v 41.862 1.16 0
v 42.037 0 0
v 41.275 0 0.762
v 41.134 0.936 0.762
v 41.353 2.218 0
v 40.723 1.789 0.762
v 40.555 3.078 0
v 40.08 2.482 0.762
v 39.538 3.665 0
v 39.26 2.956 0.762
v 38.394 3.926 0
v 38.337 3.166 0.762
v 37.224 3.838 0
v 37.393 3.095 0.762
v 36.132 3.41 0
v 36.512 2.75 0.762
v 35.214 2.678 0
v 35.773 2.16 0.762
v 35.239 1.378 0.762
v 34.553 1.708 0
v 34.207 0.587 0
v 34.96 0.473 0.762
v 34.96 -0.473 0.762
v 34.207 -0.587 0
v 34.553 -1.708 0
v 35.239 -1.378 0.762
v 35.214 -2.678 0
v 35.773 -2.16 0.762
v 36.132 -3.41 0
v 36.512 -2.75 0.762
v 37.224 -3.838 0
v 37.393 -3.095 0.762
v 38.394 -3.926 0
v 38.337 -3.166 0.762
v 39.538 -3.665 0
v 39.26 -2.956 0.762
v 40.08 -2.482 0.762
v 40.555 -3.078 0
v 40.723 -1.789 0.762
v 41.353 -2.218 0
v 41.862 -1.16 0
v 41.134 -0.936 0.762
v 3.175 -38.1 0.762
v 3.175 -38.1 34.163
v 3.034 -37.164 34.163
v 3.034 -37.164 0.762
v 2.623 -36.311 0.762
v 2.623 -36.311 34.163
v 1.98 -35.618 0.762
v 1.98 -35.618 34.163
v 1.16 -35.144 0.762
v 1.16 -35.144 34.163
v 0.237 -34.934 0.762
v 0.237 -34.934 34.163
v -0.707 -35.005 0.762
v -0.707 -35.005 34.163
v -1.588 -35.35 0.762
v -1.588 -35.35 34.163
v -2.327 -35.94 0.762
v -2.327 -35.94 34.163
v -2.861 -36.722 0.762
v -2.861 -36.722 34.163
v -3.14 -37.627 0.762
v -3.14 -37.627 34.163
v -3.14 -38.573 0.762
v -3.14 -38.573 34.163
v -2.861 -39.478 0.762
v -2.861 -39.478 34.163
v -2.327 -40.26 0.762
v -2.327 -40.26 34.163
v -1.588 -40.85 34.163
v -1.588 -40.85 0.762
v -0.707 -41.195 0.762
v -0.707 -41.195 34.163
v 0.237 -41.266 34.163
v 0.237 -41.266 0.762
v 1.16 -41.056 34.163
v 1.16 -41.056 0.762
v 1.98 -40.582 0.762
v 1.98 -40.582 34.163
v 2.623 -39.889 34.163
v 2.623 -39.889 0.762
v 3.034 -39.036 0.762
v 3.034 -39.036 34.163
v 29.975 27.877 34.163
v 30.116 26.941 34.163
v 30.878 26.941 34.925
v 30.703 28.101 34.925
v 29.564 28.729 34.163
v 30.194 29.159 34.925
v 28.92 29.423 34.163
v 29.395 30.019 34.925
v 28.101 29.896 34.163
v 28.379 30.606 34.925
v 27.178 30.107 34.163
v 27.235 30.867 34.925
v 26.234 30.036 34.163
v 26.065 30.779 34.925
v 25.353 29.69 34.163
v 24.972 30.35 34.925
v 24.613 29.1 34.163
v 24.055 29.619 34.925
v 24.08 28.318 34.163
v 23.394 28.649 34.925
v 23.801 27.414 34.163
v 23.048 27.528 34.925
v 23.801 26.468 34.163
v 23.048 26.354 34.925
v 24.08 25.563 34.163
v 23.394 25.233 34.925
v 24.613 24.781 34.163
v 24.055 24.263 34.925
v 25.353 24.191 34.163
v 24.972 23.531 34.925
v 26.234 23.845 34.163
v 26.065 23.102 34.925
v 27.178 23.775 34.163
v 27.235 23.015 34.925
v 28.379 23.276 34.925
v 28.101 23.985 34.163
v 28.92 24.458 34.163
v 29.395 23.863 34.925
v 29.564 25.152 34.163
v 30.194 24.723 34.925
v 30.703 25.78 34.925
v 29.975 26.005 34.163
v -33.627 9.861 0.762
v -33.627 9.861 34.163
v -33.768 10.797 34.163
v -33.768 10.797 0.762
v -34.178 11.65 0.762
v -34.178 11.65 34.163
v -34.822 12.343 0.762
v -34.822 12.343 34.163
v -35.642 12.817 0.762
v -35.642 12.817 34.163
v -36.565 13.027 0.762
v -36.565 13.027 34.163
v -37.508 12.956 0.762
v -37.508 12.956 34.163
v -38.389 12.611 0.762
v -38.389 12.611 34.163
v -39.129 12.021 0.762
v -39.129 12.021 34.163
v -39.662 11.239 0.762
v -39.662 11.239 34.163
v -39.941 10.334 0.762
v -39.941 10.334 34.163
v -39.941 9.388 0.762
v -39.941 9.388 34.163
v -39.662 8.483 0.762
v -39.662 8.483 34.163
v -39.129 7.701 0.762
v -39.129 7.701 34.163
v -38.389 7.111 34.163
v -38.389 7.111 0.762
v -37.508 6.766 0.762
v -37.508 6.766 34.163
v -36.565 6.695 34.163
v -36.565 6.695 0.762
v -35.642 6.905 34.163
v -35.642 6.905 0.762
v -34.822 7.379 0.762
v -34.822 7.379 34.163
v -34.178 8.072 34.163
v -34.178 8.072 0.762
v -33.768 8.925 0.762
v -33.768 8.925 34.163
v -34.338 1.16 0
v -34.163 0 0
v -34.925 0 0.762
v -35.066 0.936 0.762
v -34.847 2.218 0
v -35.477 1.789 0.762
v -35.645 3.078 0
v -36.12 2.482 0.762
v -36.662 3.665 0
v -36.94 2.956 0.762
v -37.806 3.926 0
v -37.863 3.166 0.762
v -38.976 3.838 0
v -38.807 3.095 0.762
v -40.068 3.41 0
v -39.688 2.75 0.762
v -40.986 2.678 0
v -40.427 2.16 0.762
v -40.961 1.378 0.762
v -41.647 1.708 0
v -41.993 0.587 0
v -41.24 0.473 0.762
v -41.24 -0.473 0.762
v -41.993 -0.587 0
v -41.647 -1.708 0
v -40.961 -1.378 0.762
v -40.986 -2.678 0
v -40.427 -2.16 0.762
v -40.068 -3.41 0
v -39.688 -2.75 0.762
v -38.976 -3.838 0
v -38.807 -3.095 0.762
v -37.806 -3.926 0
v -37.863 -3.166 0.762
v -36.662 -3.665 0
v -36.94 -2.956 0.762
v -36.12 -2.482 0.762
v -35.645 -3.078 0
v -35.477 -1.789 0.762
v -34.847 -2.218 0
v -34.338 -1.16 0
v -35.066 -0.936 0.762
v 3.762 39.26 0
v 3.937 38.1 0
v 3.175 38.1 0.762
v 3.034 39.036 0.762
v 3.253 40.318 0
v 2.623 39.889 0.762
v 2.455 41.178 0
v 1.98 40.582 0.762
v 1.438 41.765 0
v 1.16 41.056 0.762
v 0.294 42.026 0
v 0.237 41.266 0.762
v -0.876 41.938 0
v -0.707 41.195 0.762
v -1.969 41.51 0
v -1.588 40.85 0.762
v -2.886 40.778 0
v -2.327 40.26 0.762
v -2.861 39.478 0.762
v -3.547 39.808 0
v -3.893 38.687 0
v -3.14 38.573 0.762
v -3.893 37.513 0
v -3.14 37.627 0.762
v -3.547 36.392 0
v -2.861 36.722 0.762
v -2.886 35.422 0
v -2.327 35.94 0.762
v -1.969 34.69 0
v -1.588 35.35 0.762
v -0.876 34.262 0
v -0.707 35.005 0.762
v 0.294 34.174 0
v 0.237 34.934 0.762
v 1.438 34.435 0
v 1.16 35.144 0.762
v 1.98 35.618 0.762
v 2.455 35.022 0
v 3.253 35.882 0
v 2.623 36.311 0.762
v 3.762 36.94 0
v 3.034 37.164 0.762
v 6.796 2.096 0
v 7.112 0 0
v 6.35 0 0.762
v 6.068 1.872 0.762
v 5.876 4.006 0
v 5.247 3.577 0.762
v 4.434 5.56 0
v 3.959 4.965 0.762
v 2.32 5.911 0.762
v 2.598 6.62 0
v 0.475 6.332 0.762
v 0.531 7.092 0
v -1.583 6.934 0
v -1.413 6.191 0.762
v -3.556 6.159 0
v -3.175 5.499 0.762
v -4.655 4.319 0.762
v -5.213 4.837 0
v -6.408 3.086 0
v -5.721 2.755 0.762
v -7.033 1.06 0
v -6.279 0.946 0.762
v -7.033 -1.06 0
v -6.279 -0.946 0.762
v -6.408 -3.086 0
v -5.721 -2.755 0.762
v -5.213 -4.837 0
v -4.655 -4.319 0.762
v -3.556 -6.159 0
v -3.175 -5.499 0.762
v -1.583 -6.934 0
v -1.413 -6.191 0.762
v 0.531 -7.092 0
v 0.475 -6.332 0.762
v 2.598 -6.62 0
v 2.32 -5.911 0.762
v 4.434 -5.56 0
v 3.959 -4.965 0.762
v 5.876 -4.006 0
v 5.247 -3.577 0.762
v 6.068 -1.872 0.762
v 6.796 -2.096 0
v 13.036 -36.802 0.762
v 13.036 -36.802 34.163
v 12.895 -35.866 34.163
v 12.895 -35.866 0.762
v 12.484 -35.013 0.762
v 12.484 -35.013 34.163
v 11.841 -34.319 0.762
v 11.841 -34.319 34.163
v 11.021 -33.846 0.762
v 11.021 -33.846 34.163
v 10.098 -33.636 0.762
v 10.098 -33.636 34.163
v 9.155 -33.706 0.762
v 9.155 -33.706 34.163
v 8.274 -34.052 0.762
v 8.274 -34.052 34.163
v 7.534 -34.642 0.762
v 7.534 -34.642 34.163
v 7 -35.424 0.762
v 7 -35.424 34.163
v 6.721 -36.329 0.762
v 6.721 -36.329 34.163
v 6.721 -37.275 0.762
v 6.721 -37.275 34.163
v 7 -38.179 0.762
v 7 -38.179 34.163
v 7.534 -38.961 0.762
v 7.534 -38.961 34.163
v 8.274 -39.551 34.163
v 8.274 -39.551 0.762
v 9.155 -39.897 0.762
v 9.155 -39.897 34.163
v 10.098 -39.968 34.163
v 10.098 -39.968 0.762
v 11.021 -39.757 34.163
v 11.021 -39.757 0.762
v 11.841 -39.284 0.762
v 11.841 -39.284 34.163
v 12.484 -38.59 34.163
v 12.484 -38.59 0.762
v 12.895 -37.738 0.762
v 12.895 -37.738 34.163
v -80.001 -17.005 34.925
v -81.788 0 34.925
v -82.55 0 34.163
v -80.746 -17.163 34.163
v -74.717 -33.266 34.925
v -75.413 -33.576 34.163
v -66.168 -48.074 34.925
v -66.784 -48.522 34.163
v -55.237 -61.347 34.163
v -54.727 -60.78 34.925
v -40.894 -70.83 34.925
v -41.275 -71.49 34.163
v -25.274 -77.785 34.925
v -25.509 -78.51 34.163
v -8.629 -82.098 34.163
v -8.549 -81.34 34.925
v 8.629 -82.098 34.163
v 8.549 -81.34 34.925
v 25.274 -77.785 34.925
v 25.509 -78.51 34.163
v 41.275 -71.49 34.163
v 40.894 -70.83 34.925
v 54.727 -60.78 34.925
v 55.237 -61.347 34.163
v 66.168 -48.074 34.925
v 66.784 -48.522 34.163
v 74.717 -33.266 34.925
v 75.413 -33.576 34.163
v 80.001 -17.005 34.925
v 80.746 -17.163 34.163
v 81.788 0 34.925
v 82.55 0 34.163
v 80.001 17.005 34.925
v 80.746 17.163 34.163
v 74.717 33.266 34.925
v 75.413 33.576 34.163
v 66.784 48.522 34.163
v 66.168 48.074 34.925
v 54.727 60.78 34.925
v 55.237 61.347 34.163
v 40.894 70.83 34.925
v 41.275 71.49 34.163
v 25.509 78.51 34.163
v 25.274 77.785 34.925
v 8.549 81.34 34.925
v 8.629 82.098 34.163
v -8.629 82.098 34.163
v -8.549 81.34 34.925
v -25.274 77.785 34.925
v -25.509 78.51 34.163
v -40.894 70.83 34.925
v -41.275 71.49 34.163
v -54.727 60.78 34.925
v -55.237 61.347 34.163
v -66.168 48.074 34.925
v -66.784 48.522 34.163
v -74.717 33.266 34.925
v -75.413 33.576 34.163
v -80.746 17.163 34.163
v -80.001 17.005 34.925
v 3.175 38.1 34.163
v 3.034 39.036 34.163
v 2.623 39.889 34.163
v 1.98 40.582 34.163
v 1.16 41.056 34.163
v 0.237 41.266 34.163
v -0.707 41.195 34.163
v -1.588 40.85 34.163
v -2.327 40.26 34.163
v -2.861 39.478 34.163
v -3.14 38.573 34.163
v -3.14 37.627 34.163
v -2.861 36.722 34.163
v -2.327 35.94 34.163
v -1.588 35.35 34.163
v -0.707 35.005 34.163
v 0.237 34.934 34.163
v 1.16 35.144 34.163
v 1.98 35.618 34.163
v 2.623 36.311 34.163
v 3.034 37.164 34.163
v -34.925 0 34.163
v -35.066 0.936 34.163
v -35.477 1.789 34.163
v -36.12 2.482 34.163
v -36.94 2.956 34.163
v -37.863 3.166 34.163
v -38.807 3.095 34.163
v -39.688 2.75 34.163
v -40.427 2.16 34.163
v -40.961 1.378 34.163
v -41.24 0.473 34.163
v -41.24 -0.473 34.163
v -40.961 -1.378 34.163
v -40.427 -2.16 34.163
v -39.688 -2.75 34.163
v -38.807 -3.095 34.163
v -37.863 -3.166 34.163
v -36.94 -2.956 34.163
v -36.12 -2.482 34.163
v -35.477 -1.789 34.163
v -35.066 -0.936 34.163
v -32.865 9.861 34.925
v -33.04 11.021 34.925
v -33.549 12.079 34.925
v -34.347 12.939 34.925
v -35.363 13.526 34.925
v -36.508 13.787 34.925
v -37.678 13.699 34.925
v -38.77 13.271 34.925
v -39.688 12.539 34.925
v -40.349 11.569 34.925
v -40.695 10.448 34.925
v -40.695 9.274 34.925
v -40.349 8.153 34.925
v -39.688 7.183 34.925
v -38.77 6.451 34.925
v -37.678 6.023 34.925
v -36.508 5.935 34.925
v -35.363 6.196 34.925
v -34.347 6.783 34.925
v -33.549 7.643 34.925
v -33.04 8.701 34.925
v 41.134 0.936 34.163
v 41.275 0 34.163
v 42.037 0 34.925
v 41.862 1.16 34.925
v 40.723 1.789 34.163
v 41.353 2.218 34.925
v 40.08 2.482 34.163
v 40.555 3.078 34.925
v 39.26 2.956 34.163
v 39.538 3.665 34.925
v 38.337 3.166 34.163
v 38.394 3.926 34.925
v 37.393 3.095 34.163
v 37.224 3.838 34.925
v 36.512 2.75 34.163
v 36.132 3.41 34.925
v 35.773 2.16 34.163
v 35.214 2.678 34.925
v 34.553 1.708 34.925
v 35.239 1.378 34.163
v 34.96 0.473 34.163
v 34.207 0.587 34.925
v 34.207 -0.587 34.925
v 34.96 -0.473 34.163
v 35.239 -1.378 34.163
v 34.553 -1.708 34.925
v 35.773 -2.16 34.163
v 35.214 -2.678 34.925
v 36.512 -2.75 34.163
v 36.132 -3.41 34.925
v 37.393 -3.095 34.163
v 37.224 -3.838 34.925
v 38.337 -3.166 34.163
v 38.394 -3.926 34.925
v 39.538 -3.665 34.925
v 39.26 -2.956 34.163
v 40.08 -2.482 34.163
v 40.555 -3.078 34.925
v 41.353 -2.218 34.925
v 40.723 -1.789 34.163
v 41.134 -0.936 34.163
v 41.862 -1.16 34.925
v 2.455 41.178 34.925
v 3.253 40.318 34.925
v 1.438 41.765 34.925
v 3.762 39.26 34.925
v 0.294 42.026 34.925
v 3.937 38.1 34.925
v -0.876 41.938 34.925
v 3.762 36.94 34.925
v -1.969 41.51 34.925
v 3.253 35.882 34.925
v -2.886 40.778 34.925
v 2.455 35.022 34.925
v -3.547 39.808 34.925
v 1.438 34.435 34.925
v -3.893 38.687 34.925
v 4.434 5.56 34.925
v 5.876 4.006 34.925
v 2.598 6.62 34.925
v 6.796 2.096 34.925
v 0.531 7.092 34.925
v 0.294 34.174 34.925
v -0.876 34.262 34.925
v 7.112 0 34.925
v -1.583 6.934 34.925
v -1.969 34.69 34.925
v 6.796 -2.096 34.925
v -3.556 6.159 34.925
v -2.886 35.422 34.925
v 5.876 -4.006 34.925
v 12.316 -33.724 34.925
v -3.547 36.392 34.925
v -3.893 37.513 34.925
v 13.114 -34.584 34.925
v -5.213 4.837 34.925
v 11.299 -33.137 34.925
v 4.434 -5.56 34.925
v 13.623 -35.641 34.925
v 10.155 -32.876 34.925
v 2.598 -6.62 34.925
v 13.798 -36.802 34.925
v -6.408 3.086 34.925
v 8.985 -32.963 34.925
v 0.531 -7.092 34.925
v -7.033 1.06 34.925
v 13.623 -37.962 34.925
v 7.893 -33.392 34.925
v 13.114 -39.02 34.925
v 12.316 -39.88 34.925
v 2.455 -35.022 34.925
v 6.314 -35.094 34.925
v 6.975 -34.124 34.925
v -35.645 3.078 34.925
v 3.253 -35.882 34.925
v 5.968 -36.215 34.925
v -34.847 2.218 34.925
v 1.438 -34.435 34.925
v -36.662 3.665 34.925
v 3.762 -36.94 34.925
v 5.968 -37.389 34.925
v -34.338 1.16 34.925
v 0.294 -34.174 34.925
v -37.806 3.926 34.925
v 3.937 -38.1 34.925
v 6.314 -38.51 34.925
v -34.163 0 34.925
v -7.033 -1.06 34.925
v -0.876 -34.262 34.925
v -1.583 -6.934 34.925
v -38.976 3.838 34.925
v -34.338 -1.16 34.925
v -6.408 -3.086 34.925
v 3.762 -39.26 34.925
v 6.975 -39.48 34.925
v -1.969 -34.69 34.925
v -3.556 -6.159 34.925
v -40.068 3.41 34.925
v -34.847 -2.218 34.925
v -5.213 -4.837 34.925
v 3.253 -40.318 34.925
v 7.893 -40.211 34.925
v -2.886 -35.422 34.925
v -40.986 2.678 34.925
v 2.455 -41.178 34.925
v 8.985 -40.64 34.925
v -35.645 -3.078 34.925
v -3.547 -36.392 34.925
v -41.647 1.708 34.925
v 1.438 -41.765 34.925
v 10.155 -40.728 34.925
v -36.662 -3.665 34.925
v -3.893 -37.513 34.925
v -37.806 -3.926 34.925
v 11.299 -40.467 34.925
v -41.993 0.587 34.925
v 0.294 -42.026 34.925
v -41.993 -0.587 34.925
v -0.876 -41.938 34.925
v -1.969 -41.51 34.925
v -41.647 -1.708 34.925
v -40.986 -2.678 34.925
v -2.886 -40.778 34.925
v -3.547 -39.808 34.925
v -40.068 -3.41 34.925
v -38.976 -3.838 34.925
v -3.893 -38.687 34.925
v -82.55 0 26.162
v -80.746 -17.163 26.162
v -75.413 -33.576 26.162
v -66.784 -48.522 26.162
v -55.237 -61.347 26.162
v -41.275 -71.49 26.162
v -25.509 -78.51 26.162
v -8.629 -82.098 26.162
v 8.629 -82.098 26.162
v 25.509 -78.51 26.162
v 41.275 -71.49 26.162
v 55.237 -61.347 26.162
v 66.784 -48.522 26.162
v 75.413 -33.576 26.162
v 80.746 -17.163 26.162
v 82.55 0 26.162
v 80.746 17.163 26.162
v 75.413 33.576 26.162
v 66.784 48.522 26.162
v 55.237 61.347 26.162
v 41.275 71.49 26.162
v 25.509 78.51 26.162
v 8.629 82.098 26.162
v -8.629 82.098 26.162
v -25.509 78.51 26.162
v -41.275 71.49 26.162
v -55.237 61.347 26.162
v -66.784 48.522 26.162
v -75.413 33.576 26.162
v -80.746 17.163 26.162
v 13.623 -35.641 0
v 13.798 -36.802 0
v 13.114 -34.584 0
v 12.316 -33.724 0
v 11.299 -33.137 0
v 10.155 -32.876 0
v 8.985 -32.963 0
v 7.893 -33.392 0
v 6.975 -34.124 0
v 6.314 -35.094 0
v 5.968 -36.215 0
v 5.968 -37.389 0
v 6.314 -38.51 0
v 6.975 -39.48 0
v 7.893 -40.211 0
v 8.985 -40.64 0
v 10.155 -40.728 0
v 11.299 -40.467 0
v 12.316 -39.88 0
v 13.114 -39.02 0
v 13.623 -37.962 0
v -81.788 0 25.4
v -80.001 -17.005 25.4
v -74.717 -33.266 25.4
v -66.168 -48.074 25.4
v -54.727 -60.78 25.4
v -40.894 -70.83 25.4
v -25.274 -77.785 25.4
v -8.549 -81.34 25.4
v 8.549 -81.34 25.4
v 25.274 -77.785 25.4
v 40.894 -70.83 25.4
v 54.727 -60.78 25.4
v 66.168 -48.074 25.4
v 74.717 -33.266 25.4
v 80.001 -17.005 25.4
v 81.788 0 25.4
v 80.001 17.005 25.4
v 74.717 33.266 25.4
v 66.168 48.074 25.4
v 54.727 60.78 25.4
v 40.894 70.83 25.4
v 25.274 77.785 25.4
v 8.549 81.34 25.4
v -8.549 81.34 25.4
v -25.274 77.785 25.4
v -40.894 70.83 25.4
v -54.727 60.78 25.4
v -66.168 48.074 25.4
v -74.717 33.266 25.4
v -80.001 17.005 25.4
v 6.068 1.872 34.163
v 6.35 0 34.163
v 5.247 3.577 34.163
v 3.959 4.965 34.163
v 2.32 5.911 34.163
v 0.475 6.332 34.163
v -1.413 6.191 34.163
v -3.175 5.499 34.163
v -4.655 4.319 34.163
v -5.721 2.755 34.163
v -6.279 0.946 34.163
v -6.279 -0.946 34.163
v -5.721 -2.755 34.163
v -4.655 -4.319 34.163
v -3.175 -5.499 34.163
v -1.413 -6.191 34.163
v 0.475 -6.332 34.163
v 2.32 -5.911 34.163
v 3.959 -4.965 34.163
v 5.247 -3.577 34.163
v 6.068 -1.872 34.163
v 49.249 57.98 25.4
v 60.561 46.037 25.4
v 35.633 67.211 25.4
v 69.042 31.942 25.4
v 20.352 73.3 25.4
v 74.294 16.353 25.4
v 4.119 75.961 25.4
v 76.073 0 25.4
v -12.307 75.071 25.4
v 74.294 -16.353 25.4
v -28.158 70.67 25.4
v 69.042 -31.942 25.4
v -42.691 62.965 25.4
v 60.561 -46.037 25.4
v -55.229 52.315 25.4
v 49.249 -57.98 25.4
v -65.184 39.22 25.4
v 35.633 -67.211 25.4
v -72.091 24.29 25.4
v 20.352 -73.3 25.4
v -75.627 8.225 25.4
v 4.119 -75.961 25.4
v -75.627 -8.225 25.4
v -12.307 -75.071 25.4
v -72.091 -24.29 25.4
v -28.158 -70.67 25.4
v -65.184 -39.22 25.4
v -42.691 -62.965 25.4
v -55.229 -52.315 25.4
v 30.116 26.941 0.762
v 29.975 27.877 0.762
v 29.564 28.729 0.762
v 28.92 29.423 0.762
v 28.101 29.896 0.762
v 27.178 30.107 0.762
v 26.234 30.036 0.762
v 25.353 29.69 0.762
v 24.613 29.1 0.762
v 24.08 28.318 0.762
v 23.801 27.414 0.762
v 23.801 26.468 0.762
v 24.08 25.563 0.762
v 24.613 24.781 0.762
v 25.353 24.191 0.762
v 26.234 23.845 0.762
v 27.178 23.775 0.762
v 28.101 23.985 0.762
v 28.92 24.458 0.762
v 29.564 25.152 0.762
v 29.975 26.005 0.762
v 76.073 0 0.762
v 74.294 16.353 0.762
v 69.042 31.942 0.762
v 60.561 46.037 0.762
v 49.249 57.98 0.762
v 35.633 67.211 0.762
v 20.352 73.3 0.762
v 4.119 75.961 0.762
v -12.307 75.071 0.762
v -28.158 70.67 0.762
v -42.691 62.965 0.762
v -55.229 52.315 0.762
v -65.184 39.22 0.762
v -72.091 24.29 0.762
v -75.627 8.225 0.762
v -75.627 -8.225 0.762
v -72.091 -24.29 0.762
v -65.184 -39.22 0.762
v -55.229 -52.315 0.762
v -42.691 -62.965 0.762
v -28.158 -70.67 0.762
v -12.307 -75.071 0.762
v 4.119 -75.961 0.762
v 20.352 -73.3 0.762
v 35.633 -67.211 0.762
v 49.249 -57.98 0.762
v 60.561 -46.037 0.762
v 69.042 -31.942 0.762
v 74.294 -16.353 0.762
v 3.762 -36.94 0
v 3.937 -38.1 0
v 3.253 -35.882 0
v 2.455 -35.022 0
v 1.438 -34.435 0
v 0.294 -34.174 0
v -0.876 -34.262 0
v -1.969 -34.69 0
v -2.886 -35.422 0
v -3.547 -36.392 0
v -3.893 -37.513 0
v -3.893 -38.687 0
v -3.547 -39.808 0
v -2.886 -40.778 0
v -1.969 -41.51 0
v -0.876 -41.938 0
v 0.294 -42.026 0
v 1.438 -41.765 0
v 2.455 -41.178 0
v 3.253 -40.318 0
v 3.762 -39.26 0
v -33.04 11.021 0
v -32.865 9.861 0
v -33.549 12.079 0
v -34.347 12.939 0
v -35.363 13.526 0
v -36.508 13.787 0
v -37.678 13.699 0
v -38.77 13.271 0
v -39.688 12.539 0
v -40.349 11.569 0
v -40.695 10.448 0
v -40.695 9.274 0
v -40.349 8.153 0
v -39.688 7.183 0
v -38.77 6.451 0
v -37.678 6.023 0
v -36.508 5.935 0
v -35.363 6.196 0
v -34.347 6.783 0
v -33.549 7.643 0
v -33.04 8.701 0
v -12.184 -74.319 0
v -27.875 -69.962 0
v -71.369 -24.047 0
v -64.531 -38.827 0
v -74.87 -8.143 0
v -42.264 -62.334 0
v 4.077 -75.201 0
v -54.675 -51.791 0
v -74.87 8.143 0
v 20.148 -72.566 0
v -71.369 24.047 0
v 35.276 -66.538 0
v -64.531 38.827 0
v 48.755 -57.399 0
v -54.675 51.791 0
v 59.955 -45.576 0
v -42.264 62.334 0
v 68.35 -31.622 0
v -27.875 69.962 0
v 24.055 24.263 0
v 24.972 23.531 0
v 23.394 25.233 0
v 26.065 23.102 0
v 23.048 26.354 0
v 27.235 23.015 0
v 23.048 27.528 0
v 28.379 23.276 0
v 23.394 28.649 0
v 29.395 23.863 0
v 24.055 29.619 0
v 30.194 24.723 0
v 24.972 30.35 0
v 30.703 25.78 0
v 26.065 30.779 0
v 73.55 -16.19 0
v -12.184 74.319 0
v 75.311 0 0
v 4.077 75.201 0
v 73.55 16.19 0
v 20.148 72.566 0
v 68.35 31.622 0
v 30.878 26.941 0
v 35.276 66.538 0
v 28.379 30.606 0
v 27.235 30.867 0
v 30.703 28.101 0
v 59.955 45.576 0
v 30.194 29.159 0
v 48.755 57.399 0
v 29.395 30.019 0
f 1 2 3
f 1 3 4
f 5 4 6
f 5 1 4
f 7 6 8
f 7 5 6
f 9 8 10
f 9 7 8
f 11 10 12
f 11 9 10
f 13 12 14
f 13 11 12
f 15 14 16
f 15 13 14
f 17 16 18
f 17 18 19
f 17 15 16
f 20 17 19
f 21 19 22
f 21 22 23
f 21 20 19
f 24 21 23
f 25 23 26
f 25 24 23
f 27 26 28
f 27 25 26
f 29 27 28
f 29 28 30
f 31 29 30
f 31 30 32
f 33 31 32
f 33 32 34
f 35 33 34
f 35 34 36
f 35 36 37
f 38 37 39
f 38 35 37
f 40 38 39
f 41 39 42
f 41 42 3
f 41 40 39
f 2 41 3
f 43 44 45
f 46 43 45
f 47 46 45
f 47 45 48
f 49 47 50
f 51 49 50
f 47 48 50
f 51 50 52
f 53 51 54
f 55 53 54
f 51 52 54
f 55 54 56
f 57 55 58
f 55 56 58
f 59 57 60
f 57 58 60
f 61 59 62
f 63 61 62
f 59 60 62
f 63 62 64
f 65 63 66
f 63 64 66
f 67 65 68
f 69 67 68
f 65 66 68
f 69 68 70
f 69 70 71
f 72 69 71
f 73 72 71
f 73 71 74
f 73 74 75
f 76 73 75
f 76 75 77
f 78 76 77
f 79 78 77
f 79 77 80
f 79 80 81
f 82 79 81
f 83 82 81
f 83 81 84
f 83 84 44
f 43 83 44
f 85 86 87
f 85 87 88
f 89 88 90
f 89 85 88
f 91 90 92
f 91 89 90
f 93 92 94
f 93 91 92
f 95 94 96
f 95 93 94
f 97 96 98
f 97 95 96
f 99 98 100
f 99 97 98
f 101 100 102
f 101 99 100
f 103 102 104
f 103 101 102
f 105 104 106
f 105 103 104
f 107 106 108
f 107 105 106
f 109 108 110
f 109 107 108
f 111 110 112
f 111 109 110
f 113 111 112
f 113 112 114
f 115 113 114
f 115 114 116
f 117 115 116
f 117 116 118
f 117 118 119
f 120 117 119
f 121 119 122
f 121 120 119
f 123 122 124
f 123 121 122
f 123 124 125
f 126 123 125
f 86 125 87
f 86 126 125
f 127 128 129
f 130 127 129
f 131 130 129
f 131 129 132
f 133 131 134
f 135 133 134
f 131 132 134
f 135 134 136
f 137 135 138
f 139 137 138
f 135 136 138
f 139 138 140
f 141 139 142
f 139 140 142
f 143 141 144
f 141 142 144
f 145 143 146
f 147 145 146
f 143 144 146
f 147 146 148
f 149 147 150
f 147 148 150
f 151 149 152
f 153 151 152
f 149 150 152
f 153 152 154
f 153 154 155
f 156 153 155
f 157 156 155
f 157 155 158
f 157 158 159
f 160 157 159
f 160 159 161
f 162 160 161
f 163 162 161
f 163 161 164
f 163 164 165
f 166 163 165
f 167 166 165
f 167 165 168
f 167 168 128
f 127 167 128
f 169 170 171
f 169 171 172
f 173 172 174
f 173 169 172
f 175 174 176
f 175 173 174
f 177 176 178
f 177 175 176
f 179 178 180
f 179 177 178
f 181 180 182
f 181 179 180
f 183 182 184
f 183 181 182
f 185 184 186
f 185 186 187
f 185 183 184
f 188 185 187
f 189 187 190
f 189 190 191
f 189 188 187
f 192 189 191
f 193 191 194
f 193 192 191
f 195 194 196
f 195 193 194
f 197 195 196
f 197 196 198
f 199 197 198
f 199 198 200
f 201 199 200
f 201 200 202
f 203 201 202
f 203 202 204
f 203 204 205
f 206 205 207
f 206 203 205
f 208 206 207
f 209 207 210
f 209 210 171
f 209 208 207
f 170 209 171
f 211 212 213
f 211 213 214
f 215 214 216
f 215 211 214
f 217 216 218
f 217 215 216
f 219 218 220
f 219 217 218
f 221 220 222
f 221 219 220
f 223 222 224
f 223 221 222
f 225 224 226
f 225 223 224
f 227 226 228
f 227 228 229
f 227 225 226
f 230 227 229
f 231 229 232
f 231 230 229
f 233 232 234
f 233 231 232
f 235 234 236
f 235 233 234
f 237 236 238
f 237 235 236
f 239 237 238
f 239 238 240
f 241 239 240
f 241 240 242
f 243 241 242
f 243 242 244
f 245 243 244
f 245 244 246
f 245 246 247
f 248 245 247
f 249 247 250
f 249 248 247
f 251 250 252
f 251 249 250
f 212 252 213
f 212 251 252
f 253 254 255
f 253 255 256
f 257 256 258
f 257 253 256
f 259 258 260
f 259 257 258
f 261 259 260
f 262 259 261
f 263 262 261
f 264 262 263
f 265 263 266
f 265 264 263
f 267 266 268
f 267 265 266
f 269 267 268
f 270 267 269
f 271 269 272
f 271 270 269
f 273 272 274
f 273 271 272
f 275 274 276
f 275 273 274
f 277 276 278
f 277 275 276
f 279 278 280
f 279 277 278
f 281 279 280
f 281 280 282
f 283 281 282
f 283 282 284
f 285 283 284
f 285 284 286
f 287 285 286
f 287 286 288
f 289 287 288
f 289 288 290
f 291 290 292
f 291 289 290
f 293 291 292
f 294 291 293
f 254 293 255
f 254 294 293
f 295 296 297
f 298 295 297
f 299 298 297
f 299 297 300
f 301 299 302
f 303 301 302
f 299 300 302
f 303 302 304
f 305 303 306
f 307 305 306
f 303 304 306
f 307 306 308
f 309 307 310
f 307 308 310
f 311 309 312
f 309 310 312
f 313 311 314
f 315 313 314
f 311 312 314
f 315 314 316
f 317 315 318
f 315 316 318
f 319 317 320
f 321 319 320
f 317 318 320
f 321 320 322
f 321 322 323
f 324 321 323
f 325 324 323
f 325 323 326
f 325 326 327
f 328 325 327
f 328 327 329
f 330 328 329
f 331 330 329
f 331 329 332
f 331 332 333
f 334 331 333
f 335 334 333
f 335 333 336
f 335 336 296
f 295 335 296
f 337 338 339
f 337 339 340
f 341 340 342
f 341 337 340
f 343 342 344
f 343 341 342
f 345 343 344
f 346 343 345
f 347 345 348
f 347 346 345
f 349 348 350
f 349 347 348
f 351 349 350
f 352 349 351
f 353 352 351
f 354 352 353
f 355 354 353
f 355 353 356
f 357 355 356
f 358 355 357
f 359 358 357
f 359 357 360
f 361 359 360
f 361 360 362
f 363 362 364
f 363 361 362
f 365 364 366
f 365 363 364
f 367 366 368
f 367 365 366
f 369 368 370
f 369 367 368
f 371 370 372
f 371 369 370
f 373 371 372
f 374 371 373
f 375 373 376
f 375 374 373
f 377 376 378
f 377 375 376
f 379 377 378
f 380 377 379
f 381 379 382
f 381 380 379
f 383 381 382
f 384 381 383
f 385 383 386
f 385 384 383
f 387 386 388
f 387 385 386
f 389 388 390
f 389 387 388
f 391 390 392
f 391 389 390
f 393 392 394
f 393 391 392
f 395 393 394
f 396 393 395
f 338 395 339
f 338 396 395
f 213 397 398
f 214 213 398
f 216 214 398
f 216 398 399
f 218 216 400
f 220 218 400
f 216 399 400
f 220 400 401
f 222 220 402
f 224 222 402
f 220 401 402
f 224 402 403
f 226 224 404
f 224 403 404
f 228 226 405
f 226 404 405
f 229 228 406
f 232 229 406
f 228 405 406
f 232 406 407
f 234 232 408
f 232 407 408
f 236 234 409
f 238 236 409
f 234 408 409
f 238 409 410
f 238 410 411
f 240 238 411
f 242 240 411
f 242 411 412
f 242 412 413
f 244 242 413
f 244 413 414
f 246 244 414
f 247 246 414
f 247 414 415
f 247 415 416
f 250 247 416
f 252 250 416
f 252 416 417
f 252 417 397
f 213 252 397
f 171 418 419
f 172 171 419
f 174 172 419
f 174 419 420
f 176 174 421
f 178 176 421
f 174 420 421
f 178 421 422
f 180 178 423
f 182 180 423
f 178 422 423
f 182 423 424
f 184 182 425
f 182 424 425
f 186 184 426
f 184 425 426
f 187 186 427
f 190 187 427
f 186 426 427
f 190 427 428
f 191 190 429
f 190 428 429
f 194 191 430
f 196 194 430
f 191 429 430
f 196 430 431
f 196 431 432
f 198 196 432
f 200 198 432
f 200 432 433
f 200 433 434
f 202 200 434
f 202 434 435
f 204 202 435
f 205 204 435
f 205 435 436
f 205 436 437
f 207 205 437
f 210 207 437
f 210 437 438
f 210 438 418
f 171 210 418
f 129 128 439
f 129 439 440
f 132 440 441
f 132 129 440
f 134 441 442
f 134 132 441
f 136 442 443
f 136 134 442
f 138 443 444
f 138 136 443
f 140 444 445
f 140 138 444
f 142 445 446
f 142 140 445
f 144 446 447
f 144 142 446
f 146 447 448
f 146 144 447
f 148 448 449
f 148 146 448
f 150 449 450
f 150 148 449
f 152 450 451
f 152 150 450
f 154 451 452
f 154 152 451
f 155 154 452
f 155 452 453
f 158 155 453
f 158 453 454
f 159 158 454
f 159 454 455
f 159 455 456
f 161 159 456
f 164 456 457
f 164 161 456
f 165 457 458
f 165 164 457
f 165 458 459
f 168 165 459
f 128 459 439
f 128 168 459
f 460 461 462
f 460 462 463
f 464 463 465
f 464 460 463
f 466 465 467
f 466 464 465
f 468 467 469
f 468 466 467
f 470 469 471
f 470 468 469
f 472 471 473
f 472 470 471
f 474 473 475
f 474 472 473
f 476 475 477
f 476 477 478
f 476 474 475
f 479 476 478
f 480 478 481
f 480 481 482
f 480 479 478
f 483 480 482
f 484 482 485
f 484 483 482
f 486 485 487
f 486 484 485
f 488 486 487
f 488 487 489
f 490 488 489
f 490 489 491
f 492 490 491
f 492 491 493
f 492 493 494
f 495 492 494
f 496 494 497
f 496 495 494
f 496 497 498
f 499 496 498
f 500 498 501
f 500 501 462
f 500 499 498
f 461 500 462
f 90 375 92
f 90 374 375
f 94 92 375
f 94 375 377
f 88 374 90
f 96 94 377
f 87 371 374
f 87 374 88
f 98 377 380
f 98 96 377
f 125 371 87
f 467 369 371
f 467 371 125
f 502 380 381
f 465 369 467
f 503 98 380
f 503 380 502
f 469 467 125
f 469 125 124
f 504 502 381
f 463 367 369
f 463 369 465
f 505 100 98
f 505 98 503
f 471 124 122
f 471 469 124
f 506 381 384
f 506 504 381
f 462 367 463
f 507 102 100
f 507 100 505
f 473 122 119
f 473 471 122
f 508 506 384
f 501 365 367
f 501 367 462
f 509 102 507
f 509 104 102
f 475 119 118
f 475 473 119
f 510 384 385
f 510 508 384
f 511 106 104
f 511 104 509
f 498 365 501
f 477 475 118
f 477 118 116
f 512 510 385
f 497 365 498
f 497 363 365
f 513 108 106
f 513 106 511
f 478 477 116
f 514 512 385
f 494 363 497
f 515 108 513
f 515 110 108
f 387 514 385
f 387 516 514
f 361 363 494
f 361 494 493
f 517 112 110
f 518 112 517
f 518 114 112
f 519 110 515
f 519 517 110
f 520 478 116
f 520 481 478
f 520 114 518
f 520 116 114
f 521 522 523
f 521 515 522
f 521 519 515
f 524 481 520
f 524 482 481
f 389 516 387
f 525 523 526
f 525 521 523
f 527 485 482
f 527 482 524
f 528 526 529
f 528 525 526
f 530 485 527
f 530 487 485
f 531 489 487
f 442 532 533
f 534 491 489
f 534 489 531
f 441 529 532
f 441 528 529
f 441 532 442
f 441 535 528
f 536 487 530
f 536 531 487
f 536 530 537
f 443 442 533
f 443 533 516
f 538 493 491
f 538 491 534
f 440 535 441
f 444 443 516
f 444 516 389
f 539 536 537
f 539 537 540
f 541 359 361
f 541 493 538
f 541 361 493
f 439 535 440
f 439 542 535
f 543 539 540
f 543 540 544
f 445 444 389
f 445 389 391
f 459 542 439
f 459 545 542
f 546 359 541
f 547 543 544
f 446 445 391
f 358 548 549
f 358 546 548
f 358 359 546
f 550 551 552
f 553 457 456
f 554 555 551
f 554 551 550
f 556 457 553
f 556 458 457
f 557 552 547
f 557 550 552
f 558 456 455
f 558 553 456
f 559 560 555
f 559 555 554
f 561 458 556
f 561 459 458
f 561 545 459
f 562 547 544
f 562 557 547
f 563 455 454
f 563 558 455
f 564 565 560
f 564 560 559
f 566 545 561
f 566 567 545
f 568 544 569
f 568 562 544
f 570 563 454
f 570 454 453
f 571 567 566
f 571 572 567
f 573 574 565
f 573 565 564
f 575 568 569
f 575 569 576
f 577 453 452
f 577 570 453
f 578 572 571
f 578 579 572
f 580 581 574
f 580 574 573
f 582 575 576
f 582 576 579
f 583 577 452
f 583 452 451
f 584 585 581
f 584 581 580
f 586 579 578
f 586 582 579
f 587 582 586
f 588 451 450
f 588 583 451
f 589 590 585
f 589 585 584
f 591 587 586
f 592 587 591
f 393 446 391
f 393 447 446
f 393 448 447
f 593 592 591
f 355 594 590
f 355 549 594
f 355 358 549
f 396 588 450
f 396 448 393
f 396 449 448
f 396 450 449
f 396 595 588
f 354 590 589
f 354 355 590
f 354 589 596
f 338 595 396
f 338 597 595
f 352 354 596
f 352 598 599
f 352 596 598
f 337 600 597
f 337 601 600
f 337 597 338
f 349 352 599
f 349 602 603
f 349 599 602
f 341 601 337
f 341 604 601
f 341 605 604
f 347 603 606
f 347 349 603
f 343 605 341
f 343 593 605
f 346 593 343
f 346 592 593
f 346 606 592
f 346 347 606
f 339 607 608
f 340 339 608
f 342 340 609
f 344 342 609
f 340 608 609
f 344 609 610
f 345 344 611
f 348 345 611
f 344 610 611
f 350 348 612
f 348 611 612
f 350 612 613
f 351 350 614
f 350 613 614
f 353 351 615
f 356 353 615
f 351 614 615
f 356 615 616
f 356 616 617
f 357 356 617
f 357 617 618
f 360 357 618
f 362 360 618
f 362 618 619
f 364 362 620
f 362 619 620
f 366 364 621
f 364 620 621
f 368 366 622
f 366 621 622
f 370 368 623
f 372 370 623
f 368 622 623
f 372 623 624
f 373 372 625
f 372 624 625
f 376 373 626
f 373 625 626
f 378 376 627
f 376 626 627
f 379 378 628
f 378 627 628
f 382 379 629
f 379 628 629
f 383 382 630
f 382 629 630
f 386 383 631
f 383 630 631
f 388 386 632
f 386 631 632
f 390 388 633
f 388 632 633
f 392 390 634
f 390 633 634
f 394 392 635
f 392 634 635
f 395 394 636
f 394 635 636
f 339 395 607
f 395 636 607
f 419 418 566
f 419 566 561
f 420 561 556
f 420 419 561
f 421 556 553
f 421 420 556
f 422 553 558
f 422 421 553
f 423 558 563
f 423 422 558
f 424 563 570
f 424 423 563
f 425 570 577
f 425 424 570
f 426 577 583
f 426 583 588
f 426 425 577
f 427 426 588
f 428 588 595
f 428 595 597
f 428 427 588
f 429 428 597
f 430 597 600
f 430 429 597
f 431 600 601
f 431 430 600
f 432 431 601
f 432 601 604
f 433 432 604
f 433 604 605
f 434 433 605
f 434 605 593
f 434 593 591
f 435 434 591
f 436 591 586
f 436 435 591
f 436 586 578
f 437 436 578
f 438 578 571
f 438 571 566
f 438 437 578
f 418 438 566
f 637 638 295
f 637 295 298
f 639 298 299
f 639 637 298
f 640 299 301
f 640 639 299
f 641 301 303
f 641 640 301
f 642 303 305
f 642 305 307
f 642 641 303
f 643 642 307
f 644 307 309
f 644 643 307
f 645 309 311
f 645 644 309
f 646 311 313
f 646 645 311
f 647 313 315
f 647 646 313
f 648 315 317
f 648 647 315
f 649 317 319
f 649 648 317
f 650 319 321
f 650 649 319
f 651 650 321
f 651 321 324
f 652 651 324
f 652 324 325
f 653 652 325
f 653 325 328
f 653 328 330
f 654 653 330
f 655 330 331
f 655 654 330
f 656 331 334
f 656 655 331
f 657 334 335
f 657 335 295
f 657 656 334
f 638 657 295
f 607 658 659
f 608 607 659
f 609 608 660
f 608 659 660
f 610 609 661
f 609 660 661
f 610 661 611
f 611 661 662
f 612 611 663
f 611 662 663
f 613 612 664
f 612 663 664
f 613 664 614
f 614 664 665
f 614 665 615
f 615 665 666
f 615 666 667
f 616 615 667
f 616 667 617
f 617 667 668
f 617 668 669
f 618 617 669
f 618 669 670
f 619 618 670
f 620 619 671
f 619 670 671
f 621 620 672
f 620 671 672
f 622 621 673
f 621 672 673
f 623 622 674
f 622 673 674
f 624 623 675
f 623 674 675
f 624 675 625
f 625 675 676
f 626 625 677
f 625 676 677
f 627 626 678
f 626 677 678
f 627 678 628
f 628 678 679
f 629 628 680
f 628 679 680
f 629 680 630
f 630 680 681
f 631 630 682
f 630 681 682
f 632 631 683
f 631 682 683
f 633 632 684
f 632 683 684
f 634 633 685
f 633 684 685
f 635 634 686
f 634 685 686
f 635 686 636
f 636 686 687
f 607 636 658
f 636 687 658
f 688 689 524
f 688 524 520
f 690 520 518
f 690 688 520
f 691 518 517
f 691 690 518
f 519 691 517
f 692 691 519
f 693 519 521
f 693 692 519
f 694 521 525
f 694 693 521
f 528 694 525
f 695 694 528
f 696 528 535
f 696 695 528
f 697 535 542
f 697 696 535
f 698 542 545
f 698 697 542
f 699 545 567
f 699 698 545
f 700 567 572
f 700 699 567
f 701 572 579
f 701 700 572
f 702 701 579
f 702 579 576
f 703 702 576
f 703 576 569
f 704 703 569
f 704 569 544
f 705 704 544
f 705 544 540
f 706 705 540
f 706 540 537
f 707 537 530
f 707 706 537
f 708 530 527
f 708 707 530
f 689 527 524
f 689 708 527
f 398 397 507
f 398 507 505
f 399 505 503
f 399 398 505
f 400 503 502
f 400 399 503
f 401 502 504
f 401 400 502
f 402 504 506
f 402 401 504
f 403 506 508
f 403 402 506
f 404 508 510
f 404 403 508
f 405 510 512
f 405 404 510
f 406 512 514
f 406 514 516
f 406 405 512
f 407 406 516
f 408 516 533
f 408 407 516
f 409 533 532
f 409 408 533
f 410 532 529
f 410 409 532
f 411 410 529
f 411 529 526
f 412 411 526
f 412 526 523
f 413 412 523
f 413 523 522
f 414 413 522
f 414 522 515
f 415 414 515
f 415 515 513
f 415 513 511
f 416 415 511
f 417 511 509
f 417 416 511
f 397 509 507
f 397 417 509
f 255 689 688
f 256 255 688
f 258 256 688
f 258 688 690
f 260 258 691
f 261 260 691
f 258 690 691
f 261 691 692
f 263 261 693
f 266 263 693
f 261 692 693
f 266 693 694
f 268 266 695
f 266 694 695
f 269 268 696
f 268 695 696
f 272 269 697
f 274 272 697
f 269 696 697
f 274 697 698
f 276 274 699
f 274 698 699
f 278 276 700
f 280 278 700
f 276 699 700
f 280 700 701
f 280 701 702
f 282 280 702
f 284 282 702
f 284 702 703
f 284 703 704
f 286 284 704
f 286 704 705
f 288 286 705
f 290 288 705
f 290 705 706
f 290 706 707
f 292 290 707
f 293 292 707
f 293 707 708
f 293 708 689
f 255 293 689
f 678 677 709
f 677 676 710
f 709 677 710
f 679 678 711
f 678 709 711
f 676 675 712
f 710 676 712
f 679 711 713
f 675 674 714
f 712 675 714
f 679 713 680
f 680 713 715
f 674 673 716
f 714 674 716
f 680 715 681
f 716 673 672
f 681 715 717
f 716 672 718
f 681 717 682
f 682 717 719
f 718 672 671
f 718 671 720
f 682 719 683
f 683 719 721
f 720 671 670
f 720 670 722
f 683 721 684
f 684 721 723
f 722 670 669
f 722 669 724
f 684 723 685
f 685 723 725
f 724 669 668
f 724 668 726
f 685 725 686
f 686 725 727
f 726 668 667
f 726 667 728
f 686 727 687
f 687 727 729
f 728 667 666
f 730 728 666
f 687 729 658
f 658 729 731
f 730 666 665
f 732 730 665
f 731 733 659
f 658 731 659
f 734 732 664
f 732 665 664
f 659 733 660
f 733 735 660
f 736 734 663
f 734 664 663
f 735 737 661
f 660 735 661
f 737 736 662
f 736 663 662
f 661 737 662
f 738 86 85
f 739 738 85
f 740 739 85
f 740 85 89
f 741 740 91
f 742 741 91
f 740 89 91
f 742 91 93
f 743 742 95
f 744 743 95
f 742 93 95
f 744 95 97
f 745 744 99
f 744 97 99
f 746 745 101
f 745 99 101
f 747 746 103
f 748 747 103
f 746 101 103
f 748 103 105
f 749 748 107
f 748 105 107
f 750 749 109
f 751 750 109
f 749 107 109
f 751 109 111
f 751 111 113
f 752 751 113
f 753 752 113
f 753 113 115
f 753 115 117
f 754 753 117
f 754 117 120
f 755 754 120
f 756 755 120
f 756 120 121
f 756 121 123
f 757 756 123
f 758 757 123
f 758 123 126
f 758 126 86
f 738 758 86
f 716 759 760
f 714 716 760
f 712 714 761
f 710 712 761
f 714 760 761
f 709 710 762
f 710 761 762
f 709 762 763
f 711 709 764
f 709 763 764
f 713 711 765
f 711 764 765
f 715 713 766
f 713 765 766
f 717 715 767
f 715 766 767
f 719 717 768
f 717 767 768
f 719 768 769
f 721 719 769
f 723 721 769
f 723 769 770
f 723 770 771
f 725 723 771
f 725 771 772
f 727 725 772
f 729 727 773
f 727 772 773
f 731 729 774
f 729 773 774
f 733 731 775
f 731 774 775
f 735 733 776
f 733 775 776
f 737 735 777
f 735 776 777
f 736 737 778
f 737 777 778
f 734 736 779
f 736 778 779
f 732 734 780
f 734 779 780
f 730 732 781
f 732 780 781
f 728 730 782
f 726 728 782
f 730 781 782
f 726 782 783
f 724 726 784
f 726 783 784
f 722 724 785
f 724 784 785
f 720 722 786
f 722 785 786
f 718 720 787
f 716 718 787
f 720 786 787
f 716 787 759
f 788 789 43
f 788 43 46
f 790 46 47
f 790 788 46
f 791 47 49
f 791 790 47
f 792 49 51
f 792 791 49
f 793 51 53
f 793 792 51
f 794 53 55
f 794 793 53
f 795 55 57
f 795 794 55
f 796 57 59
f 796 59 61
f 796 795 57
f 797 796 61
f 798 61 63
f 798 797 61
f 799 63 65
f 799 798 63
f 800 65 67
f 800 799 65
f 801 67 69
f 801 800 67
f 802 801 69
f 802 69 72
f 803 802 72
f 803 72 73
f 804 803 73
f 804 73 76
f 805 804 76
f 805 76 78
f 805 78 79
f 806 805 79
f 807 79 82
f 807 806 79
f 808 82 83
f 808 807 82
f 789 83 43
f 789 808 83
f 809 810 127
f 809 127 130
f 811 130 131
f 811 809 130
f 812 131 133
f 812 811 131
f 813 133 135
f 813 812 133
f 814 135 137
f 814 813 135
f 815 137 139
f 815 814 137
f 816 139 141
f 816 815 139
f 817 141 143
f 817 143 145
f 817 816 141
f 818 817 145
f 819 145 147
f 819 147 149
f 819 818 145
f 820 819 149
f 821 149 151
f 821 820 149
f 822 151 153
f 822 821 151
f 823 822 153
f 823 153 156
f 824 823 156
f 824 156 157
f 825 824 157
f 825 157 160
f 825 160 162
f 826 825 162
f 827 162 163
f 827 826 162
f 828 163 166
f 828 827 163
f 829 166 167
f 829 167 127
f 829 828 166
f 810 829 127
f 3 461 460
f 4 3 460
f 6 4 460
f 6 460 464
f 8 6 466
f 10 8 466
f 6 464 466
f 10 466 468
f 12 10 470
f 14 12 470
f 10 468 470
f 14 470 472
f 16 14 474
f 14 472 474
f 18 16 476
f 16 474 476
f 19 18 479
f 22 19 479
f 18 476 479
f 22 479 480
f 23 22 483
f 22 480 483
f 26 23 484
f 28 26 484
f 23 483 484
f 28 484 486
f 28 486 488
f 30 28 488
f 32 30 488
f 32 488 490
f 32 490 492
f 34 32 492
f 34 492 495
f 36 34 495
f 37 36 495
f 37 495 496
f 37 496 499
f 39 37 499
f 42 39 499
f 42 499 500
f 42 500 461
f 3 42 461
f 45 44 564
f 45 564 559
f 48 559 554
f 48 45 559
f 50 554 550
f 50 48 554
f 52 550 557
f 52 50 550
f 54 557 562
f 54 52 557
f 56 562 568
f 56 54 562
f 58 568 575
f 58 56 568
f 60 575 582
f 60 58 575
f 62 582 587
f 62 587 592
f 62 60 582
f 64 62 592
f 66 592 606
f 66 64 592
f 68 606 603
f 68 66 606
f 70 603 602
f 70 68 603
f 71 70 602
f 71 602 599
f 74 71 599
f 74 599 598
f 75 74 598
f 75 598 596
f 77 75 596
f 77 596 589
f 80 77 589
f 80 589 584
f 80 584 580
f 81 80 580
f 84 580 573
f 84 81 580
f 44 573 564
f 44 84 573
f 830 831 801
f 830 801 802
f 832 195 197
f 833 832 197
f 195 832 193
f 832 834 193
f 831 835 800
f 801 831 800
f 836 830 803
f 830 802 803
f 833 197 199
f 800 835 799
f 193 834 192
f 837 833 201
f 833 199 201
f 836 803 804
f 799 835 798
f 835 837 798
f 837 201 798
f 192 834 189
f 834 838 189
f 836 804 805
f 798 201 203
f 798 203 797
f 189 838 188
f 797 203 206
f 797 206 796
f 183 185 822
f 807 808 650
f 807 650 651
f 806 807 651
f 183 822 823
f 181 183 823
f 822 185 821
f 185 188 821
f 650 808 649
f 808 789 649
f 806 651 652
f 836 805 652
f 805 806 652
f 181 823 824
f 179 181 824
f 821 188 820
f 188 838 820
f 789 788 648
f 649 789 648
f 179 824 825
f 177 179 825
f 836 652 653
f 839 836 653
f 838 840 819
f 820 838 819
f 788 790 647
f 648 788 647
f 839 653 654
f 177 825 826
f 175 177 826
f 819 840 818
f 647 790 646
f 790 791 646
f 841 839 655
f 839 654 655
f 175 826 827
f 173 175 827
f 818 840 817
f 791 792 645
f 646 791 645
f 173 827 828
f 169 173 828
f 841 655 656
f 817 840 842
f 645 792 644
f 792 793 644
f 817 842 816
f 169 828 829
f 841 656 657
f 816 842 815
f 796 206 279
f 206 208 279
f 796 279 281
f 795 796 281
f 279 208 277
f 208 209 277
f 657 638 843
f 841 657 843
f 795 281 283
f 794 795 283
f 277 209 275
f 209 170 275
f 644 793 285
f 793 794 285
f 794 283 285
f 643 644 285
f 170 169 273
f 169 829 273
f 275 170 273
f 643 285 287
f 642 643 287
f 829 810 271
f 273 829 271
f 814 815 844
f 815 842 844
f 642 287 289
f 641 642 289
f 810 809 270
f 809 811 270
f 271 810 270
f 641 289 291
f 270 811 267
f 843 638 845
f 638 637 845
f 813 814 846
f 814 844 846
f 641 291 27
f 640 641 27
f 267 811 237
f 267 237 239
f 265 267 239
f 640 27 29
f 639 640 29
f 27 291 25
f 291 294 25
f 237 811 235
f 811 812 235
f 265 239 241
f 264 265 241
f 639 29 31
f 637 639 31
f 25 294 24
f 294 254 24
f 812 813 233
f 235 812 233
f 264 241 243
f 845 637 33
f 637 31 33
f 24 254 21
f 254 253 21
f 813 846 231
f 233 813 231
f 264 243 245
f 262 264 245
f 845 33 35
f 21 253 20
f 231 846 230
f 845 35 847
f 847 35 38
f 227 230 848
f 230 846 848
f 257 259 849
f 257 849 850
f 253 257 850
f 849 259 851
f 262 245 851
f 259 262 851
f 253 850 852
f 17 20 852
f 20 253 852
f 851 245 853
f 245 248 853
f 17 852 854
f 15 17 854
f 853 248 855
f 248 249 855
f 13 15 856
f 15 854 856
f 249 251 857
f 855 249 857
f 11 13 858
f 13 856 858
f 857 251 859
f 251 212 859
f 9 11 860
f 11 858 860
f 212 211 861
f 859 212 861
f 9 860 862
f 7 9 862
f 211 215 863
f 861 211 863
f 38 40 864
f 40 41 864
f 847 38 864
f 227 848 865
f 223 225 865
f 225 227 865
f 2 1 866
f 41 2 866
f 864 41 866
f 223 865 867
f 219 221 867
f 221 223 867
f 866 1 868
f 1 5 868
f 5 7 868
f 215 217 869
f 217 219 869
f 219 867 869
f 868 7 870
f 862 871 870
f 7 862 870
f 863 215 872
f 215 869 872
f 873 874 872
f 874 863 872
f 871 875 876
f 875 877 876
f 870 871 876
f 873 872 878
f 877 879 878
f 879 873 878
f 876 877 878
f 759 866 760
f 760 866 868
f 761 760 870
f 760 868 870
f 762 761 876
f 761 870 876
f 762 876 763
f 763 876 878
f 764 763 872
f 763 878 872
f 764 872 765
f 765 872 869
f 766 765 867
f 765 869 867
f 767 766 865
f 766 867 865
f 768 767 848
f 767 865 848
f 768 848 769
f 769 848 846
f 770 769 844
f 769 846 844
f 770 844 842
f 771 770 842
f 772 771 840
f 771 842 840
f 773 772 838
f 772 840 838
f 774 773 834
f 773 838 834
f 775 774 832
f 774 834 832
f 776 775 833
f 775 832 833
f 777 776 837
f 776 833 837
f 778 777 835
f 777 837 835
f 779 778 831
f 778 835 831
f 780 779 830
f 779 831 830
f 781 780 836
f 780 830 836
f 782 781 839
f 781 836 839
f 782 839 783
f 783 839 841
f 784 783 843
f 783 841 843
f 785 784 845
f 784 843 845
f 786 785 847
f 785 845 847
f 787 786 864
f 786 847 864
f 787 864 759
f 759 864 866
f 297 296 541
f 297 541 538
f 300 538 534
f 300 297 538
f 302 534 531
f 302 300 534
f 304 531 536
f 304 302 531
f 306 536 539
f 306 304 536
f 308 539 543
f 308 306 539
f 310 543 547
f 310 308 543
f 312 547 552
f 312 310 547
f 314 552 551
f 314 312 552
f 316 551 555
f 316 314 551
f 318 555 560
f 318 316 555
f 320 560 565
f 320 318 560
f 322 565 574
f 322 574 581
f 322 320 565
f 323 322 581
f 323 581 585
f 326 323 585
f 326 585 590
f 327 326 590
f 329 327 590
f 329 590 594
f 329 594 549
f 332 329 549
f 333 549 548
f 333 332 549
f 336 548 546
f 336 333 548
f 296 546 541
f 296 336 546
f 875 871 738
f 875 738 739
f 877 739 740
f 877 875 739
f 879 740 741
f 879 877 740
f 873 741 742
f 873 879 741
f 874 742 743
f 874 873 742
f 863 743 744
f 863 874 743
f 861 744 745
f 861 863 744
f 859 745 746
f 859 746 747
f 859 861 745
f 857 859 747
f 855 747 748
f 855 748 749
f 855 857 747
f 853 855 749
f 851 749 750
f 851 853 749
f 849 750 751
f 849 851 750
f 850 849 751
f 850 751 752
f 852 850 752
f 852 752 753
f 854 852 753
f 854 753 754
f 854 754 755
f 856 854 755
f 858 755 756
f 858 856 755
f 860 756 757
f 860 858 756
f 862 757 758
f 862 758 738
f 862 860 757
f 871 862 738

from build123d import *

# Parameters (mm, degrees)
SKETCH1_R           = 76.073
BOSS_EXTRUDE1_DEPTH = 25.4
SKETCH2_R           = 82.55
BOSS_EXTRUDE2_DEPTH = 9.525
SKETCH3_R           = 3.175
CUT_EXTRUDE1_DEPTH  = 122.855490746
SKETCH5_R           = 6.35
CUT_EXTRUDE2_DEPTH  = 122.855490746
CHAMFER1_SIZE       = 0.762


with BuildPart() as part:
    # Sketch1 → Boss-Extrude1 (new body)
    with BuildSketch(Plane.XY):
        Circle(SKETCH1_R)
    extrude(amount=BOSS_EXTRUDE1_DEPTH)

    # Sketch2 → Boss-Extrude2 (add)
    with BuildSketch(Plane.XY.offset(25.4)):
        with Locations(Location((0, 0, 0), (0, 0, 180))):
            Circle(SKETCH2_R)
    extrude(amount=BOSS_EXTRUDE2_DEPTH)

    # Sketch3 → Cut-Extrude1 (cut, through all)
    with BuildSketch(Plane.XY.offset(34.925)):
        with Locations((0, 38.1)):
            Circle(SKETCH3_R)
        with Locations((26.940768363, 26.940768363)):
            Circle(SKETCH3_R)
        with Locations((38.1, 0)):
            Circle(SKETCH3_R)
        with Locations((9.861005618, -36.801773982)):
            Circle(SKETCH3_R)
        with Locations((0, -38.1)):
            Circle(SKETCH3_R)
        with Locations((-38.1, 0)):
            Circle(SKETCH3_R)
        with Locations((-36.801773982, 9.861005618)):
            Circle(SKETCH3_R)
    extrude(amount=-CUT_EXTRUDE1_DEPTH, mode=Mode.SUBTRACT)

    # Sketch5 → Cut-Extrude2 (cut, through all)
    with BuildSketch(Plane.XY.offset(34.925)):
        Circle(SKETCH5_R)
    extrude(amount=-CUT_EXTRUDE2_DEPTH, mode=Mode.SUBTRACT)

    # Chamfer1
    chamfer1_edges = [part.edges().sort_by_distance(p)[0] for p in [
        (-76.073, 0, 0),
        (-39.976773982, 9.861005618, 0),
        (-39.976773982, 9.861005618, 34.925),
        (-41.275, 0, 0),
        (-41.275, 0, 34.925),
        (-3.175, -38.1, 0),
        (-3.175, -38.1, 34.925),
        (6.686005618, -36.801773982, 0),
        (6.686005618, -36.801773982, 34.925),
        (-3.175, 38.1, 0),
        (-3.175, 38.1, 34.925),
        (34.925, 0, 0),
        (34.925, 0, 34.925),
        (23.765768363, 26.940768363, 0),
        (23.765768363, 26.940768363, 34.925),
        (-6.35, 0, 0),
        (-6.35, 0, 34.925),
        (82.55, 0, 25.4),
        (82.55, 0, 34.925),
    ]]
    chamfer(chamfer1_edges, length=CHAMFER1_SIZE)


solid = part.part
